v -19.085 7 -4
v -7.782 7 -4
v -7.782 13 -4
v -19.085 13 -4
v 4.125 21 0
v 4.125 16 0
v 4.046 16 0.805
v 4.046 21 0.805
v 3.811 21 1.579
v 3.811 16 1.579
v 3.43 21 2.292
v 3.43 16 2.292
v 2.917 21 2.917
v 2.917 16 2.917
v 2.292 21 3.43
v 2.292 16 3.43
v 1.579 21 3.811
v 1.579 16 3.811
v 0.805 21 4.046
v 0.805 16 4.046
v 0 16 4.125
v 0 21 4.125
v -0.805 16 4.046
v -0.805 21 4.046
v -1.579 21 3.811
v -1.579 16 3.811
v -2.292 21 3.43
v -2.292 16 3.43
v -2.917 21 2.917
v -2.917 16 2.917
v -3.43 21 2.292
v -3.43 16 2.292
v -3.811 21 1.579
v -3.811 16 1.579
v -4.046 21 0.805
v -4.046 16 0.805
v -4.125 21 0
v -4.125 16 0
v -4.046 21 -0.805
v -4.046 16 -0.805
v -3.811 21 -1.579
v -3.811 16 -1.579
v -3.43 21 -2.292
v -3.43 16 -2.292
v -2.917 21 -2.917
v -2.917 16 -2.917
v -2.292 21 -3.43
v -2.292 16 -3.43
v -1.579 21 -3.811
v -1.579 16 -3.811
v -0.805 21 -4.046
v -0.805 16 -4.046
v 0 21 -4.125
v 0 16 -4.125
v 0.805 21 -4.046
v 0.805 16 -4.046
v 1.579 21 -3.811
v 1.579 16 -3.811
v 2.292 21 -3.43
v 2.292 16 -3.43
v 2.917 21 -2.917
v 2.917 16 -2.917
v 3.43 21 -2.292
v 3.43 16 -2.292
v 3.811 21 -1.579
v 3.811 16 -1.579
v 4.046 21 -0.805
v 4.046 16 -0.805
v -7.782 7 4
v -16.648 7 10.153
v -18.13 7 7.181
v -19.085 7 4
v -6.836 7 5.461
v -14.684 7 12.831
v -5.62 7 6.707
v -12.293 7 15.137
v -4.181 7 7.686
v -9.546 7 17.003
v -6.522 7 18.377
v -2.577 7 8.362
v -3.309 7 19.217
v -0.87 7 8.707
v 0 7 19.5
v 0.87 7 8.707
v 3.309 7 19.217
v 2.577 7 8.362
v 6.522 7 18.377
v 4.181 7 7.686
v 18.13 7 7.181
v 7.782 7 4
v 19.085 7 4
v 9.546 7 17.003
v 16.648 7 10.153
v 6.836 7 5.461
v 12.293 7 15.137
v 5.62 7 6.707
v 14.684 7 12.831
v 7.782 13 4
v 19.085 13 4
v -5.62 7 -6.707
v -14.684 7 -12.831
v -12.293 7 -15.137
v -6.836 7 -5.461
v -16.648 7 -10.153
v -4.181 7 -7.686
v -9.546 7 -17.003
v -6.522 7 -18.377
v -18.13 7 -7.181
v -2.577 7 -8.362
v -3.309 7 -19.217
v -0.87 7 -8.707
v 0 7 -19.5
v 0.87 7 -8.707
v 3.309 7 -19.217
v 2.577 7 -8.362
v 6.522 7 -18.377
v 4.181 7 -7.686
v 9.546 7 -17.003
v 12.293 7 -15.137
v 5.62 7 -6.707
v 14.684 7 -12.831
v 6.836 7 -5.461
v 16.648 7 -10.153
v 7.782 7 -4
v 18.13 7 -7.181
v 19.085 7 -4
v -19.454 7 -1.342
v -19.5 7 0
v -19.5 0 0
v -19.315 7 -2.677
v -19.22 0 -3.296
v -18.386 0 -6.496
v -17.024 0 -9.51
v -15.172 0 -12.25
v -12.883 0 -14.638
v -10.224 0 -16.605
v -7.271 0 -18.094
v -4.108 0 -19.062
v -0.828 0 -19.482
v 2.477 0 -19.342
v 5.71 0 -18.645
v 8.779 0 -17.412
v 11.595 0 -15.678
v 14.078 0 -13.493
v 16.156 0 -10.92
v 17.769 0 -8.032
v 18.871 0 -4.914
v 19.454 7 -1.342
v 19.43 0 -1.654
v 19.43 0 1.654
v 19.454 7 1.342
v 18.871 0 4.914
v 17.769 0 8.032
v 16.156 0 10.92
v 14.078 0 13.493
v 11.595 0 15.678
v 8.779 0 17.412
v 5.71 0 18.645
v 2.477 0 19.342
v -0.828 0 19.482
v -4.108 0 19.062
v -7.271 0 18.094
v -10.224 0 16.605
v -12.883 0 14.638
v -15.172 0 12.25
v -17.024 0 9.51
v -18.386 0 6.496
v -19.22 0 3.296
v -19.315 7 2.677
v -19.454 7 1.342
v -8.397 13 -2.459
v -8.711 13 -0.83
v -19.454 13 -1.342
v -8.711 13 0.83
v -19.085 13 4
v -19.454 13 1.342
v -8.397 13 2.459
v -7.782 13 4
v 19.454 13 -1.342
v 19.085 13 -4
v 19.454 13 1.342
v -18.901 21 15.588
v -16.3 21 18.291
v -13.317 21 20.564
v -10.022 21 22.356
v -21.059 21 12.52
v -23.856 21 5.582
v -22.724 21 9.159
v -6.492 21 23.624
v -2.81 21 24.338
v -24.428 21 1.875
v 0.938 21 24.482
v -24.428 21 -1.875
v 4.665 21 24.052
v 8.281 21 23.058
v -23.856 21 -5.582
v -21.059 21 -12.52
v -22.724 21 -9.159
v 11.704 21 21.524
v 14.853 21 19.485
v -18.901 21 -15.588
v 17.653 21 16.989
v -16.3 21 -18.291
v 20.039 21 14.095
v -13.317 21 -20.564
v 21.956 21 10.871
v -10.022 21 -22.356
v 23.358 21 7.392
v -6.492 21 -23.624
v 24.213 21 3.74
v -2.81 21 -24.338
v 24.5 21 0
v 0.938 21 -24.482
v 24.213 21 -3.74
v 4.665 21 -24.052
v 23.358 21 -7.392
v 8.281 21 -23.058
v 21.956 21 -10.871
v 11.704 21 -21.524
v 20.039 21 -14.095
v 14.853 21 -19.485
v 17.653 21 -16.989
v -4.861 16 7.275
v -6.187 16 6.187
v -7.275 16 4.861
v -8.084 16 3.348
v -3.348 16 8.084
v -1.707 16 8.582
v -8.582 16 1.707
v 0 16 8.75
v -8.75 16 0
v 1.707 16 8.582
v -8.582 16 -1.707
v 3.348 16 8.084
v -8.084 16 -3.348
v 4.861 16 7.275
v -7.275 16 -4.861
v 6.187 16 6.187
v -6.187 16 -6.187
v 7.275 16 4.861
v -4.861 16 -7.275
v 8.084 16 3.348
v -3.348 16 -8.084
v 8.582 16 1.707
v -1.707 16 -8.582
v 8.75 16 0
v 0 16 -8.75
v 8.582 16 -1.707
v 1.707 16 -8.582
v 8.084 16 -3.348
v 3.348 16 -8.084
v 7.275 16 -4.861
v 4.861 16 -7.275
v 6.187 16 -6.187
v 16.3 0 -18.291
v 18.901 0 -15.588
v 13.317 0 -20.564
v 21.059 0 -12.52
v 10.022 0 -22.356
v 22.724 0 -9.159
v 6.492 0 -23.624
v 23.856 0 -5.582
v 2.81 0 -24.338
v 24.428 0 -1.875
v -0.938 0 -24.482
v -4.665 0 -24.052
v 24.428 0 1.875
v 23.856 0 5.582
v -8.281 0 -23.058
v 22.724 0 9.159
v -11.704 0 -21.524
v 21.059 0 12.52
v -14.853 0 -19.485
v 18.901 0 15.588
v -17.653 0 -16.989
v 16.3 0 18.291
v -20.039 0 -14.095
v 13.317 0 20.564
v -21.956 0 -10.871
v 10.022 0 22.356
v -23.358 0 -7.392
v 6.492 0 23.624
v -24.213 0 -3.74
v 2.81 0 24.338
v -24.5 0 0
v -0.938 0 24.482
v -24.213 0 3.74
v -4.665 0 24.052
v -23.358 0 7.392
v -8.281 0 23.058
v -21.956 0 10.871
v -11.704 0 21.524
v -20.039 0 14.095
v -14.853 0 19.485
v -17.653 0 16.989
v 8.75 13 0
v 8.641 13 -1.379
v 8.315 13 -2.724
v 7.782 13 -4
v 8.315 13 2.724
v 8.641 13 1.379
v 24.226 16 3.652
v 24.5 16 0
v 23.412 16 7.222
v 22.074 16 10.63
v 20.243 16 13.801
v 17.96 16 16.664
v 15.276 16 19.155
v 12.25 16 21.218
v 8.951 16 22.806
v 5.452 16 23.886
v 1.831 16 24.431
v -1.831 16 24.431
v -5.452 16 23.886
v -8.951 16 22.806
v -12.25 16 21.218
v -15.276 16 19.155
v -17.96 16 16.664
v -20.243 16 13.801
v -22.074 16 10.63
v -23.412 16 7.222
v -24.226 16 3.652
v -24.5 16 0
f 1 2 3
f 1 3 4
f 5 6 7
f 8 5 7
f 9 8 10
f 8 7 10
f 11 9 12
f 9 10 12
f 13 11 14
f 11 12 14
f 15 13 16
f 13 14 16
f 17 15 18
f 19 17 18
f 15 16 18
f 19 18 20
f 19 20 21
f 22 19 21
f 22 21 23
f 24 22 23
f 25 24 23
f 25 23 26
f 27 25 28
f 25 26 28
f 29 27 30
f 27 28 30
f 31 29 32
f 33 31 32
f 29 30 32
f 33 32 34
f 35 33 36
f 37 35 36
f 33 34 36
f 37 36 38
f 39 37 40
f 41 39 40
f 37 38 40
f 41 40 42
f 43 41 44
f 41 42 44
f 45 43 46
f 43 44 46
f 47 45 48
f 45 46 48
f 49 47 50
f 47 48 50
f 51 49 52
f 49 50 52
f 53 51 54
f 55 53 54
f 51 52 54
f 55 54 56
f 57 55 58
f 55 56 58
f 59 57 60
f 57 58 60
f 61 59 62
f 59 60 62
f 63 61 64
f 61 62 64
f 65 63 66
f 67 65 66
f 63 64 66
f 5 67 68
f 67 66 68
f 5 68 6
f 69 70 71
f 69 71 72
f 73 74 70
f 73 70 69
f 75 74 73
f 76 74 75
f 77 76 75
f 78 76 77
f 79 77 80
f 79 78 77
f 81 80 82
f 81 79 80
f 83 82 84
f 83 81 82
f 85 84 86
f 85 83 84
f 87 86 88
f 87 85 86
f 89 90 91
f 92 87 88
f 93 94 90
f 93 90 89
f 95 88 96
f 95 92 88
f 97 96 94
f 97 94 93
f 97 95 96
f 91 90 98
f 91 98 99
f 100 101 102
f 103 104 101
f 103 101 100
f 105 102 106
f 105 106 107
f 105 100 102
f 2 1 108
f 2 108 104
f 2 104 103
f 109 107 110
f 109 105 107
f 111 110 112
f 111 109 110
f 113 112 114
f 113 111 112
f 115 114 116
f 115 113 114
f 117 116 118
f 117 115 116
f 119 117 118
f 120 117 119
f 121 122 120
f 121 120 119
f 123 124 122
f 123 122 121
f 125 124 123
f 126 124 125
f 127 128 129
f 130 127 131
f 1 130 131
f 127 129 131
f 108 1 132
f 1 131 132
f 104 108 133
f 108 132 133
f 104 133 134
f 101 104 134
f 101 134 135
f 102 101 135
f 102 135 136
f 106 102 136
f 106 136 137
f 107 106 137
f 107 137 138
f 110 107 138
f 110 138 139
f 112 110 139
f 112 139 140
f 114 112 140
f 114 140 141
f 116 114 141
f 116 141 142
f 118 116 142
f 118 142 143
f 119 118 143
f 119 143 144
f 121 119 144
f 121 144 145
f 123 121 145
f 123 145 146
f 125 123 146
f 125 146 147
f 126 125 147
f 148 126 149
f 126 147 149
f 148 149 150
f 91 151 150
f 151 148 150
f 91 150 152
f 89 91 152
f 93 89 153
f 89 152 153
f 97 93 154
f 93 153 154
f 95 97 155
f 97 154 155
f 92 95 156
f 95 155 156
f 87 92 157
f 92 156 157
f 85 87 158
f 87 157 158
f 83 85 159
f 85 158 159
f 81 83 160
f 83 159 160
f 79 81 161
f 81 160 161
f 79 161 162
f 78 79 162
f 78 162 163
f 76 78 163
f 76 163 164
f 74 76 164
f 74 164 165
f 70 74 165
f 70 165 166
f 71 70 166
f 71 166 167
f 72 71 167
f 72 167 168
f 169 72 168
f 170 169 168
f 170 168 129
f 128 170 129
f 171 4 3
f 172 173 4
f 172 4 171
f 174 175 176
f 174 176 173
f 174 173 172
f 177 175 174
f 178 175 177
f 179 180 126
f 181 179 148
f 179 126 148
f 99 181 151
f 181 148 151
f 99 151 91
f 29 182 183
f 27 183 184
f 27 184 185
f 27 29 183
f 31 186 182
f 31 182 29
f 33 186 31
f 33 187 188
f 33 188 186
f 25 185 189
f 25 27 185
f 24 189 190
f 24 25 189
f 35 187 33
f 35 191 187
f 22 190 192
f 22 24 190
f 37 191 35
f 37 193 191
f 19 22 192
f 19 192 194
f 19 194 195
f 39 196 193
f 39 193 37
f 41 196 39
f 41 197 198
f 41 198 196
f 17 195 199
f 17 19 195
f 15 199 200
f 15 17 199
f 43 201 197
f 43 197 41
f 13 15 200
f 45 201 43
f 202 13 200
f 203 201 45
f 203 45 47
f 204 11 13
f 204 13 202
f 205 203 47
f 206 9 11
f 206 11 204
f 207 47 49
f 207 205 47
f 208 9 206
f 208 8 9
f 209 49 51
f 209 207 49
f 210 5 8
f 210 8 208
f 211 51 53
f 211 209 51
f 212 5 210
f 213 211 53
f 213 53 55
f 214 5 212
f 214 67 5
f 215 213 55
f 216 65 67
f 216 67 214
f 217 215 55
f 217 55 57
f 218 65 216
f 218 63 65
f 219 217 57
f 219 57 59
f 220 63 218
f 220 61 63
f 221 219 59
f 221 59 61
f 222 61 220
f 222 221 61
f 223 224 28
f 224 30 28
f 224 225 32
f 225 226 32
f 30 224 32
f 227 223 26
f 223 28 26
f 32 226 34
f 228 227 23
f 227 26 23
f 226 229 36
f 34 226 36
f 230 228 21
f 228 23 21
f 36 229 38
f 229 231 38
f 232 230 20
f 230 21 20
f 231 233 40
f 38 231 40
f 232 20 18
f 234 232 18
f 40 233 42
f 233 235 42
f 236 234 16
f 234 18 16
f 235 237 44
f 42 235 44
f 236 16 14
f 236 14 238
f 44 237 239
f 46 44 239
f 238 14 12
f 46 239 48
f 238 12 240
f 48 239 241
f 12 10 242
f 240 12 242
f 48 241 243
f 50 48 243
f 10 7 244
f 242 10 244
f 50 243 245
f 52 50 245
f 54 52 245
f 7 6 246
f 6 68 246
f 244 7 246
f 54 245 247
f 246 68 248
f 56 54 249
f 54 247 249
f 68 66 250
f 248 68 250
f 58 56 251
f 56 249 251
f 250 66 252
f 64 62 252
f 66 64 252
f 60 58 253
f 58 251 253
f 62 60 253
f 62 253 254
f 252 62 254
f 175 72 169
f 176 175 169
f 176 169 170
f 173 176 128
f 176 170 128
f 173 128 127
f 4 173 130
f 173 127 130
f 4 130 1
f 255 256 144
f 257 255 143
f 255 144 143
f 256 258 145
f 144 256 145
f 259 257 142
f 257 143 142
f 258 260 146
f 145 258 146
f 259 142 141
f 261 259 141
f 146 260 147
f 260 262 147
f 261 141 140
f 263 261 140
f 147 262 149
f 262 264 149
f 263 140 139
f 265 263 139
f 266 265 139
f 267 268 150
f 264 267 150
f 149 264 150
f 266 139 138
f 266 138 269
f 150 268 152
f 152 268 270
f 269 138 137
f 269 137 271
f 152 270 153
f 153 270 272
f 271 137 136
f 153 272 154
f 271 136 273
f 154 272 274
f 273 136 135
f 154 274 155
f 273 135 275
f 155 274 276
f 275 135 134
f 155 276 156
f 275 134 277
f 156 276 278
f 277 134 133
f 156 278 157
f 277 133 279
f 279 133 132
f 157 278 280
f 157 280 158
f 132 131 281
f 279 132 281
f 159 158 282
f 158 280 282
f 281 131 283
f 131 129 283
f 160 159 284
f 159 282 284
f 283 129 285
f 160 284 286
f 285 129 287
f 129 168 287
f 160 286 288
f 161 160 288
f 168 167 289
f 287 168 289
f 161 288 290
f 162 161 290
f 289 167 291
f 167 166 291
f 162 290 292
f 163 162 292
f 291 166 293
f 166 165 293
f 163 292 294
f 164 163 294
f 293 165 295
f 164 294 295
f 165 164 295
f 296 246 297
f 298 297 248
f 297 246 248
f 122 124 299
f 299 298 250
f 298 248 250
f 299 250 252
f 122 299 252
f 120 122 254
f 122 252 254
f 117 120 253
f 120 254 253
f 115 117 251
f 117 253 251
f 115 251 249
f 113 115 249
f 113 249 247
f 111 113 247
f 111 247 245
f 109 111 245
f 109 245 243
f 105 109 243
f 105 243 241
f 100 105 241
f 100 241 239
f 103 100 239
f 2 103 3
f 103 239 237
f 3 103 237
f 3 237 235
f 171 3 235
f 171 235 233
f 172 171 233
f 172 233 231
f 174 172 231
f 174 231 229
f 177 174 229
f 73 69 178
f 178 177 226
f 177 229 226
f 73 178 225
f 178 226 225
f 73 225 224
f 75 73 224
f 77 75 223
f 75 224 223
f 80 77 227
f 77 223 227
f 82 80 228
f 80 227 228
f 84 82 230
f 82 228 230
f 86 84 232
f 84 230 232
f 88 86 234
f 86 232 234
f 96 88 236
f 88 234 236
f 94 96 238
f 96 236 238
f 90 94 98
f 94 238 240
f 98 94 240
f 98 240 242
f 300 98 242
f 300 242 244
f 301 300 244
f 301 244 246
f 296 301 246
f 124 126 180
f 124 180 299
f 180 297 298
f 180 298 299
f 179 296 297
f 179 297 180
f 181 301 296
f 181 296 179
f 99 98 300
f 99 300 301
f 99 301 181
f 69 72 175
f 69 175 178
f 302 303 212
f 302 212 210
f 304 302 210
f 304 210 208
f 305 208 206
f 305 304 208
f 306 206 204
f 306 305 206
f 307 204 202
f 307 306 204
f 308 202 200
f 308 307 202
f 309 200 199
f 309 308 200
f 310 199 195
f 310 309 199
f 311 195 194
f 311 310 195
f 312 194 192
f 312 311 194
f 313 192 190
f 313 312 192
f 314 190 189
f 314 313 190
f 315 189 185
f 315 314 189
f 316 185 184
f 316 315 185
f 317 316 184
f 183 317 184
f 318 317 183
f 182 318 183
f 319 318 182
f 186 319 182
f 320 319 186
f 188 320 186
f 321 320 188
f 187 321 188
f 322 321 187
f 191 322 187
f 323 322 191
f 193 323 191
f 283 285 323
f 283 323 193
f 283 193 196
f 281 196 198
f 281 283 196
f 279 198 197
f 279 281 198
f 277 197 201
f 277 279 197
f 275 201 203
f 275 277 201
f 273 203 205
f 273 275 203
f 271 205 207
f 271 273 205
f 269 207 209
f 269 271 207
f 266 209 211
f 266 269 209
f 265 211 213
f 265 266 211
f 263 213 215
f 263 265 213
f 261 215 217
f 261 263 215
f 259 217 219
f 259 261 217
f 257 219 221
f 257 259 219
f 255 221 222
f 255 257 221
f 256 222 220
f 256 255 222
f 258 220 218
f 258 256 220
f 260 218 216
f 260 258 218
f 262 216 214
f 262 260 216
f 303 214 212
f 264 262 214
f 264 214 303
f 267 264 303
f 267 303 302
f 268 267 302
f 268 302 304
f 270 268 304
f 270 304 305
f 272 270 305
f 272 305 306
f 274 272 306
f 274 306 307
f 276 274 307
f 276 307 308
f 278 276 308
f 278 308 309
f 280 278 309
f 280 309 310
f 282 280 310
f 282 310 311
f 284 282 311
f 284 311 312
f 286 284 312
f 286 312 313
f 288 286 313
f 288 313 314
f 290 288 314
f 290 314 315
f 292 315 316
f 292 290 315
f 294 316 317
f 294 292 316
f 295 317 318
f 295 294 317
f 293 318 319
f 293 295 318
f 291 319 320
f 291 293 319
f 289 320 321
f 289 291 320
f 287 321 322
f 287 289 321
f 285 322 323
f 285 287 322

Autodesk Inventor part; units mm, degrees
ref_plane "YZ Plane" through (0, 0, 0) normal (1, 0, 0) x (0, 1, 0)
ref_plane "XZ Plane" through (0, 0, 0) normal (0, 1, 0) x (-1, 0, 0)
ref_plane "XY Plane" through (0, 0, 0) normal (0, 0, 1) x (1, 0, 0)
sketch "Sketch1" plane through (0, 0, 0) normal (0, 1, 0) x (-1, 0, 0)
  circle A0 centre (0, 0) radius 19.5
  circle A1 centre (0, 0) radius 24.5
  dimension "d0" = 39
  dimension "d1" = 49
extrude "Extrusion1" add sketch "Sketch1" along normal blind 16
sketch "Sketch4" plane through (0, 16, 0) normal (0, 1, 0) x (1, 0, 0)
  circle A0 centre (0, 0) radius 24.5 projected
  circle A1 centre (0, 0) radius 24.5
extrude "Extrusion3" add sketch "Sketch4" along normal blind 5
sketch "Sketch5" plane through (0, 16, 0) normal (0, -1, 0) x (1, 0, 0)
  circle A0 centre (0, 0) radius 8.75
  circle A1 centre (0, 0) radius 19.5
  dimension "d8" = 17.5
extrude "Extrusion4" add sketch "Sketch5" along normal blind 9
sketch "Sketch6" plane through (0, 7, 0) normal (0, -1, 0) x (1, 0, 0)
  circle A0 centre (0, 0) radius 19.5 projected
  line L0 (-19.0853, 4) -> (19.0853, 4)
  line L1 (19.0853, 4) -> (19.0853, -4)
  line L2 (19.0853, -4) -> (-19.0853, -4)
  line L3 (-19.0853, -4) -> (-19.0853, 4)
  line L4 (-19.0853, 4) -> (19.0853, -4) construction
  line L5 (19.0853, 4) -> (-19.0853, -4) construction
  dimension "d11" = 8
extrude "Extrusion5" cut sketch "Sketch6" against normal blind 6 contours A0 L1 | L1 L2 L3 L0 | L3 A0
sketch "Sketch7" plane through (0, 16, 0) normal (0, -1, 0) x (1, 0, 0)
  circle A0 centre (0, 0) radius 4.125
  dimension "d14" = 8.25
extrude "Extrusion6" cut sketch "Sketch7" against normal blind 5
properties part number "SeguroRueda"
